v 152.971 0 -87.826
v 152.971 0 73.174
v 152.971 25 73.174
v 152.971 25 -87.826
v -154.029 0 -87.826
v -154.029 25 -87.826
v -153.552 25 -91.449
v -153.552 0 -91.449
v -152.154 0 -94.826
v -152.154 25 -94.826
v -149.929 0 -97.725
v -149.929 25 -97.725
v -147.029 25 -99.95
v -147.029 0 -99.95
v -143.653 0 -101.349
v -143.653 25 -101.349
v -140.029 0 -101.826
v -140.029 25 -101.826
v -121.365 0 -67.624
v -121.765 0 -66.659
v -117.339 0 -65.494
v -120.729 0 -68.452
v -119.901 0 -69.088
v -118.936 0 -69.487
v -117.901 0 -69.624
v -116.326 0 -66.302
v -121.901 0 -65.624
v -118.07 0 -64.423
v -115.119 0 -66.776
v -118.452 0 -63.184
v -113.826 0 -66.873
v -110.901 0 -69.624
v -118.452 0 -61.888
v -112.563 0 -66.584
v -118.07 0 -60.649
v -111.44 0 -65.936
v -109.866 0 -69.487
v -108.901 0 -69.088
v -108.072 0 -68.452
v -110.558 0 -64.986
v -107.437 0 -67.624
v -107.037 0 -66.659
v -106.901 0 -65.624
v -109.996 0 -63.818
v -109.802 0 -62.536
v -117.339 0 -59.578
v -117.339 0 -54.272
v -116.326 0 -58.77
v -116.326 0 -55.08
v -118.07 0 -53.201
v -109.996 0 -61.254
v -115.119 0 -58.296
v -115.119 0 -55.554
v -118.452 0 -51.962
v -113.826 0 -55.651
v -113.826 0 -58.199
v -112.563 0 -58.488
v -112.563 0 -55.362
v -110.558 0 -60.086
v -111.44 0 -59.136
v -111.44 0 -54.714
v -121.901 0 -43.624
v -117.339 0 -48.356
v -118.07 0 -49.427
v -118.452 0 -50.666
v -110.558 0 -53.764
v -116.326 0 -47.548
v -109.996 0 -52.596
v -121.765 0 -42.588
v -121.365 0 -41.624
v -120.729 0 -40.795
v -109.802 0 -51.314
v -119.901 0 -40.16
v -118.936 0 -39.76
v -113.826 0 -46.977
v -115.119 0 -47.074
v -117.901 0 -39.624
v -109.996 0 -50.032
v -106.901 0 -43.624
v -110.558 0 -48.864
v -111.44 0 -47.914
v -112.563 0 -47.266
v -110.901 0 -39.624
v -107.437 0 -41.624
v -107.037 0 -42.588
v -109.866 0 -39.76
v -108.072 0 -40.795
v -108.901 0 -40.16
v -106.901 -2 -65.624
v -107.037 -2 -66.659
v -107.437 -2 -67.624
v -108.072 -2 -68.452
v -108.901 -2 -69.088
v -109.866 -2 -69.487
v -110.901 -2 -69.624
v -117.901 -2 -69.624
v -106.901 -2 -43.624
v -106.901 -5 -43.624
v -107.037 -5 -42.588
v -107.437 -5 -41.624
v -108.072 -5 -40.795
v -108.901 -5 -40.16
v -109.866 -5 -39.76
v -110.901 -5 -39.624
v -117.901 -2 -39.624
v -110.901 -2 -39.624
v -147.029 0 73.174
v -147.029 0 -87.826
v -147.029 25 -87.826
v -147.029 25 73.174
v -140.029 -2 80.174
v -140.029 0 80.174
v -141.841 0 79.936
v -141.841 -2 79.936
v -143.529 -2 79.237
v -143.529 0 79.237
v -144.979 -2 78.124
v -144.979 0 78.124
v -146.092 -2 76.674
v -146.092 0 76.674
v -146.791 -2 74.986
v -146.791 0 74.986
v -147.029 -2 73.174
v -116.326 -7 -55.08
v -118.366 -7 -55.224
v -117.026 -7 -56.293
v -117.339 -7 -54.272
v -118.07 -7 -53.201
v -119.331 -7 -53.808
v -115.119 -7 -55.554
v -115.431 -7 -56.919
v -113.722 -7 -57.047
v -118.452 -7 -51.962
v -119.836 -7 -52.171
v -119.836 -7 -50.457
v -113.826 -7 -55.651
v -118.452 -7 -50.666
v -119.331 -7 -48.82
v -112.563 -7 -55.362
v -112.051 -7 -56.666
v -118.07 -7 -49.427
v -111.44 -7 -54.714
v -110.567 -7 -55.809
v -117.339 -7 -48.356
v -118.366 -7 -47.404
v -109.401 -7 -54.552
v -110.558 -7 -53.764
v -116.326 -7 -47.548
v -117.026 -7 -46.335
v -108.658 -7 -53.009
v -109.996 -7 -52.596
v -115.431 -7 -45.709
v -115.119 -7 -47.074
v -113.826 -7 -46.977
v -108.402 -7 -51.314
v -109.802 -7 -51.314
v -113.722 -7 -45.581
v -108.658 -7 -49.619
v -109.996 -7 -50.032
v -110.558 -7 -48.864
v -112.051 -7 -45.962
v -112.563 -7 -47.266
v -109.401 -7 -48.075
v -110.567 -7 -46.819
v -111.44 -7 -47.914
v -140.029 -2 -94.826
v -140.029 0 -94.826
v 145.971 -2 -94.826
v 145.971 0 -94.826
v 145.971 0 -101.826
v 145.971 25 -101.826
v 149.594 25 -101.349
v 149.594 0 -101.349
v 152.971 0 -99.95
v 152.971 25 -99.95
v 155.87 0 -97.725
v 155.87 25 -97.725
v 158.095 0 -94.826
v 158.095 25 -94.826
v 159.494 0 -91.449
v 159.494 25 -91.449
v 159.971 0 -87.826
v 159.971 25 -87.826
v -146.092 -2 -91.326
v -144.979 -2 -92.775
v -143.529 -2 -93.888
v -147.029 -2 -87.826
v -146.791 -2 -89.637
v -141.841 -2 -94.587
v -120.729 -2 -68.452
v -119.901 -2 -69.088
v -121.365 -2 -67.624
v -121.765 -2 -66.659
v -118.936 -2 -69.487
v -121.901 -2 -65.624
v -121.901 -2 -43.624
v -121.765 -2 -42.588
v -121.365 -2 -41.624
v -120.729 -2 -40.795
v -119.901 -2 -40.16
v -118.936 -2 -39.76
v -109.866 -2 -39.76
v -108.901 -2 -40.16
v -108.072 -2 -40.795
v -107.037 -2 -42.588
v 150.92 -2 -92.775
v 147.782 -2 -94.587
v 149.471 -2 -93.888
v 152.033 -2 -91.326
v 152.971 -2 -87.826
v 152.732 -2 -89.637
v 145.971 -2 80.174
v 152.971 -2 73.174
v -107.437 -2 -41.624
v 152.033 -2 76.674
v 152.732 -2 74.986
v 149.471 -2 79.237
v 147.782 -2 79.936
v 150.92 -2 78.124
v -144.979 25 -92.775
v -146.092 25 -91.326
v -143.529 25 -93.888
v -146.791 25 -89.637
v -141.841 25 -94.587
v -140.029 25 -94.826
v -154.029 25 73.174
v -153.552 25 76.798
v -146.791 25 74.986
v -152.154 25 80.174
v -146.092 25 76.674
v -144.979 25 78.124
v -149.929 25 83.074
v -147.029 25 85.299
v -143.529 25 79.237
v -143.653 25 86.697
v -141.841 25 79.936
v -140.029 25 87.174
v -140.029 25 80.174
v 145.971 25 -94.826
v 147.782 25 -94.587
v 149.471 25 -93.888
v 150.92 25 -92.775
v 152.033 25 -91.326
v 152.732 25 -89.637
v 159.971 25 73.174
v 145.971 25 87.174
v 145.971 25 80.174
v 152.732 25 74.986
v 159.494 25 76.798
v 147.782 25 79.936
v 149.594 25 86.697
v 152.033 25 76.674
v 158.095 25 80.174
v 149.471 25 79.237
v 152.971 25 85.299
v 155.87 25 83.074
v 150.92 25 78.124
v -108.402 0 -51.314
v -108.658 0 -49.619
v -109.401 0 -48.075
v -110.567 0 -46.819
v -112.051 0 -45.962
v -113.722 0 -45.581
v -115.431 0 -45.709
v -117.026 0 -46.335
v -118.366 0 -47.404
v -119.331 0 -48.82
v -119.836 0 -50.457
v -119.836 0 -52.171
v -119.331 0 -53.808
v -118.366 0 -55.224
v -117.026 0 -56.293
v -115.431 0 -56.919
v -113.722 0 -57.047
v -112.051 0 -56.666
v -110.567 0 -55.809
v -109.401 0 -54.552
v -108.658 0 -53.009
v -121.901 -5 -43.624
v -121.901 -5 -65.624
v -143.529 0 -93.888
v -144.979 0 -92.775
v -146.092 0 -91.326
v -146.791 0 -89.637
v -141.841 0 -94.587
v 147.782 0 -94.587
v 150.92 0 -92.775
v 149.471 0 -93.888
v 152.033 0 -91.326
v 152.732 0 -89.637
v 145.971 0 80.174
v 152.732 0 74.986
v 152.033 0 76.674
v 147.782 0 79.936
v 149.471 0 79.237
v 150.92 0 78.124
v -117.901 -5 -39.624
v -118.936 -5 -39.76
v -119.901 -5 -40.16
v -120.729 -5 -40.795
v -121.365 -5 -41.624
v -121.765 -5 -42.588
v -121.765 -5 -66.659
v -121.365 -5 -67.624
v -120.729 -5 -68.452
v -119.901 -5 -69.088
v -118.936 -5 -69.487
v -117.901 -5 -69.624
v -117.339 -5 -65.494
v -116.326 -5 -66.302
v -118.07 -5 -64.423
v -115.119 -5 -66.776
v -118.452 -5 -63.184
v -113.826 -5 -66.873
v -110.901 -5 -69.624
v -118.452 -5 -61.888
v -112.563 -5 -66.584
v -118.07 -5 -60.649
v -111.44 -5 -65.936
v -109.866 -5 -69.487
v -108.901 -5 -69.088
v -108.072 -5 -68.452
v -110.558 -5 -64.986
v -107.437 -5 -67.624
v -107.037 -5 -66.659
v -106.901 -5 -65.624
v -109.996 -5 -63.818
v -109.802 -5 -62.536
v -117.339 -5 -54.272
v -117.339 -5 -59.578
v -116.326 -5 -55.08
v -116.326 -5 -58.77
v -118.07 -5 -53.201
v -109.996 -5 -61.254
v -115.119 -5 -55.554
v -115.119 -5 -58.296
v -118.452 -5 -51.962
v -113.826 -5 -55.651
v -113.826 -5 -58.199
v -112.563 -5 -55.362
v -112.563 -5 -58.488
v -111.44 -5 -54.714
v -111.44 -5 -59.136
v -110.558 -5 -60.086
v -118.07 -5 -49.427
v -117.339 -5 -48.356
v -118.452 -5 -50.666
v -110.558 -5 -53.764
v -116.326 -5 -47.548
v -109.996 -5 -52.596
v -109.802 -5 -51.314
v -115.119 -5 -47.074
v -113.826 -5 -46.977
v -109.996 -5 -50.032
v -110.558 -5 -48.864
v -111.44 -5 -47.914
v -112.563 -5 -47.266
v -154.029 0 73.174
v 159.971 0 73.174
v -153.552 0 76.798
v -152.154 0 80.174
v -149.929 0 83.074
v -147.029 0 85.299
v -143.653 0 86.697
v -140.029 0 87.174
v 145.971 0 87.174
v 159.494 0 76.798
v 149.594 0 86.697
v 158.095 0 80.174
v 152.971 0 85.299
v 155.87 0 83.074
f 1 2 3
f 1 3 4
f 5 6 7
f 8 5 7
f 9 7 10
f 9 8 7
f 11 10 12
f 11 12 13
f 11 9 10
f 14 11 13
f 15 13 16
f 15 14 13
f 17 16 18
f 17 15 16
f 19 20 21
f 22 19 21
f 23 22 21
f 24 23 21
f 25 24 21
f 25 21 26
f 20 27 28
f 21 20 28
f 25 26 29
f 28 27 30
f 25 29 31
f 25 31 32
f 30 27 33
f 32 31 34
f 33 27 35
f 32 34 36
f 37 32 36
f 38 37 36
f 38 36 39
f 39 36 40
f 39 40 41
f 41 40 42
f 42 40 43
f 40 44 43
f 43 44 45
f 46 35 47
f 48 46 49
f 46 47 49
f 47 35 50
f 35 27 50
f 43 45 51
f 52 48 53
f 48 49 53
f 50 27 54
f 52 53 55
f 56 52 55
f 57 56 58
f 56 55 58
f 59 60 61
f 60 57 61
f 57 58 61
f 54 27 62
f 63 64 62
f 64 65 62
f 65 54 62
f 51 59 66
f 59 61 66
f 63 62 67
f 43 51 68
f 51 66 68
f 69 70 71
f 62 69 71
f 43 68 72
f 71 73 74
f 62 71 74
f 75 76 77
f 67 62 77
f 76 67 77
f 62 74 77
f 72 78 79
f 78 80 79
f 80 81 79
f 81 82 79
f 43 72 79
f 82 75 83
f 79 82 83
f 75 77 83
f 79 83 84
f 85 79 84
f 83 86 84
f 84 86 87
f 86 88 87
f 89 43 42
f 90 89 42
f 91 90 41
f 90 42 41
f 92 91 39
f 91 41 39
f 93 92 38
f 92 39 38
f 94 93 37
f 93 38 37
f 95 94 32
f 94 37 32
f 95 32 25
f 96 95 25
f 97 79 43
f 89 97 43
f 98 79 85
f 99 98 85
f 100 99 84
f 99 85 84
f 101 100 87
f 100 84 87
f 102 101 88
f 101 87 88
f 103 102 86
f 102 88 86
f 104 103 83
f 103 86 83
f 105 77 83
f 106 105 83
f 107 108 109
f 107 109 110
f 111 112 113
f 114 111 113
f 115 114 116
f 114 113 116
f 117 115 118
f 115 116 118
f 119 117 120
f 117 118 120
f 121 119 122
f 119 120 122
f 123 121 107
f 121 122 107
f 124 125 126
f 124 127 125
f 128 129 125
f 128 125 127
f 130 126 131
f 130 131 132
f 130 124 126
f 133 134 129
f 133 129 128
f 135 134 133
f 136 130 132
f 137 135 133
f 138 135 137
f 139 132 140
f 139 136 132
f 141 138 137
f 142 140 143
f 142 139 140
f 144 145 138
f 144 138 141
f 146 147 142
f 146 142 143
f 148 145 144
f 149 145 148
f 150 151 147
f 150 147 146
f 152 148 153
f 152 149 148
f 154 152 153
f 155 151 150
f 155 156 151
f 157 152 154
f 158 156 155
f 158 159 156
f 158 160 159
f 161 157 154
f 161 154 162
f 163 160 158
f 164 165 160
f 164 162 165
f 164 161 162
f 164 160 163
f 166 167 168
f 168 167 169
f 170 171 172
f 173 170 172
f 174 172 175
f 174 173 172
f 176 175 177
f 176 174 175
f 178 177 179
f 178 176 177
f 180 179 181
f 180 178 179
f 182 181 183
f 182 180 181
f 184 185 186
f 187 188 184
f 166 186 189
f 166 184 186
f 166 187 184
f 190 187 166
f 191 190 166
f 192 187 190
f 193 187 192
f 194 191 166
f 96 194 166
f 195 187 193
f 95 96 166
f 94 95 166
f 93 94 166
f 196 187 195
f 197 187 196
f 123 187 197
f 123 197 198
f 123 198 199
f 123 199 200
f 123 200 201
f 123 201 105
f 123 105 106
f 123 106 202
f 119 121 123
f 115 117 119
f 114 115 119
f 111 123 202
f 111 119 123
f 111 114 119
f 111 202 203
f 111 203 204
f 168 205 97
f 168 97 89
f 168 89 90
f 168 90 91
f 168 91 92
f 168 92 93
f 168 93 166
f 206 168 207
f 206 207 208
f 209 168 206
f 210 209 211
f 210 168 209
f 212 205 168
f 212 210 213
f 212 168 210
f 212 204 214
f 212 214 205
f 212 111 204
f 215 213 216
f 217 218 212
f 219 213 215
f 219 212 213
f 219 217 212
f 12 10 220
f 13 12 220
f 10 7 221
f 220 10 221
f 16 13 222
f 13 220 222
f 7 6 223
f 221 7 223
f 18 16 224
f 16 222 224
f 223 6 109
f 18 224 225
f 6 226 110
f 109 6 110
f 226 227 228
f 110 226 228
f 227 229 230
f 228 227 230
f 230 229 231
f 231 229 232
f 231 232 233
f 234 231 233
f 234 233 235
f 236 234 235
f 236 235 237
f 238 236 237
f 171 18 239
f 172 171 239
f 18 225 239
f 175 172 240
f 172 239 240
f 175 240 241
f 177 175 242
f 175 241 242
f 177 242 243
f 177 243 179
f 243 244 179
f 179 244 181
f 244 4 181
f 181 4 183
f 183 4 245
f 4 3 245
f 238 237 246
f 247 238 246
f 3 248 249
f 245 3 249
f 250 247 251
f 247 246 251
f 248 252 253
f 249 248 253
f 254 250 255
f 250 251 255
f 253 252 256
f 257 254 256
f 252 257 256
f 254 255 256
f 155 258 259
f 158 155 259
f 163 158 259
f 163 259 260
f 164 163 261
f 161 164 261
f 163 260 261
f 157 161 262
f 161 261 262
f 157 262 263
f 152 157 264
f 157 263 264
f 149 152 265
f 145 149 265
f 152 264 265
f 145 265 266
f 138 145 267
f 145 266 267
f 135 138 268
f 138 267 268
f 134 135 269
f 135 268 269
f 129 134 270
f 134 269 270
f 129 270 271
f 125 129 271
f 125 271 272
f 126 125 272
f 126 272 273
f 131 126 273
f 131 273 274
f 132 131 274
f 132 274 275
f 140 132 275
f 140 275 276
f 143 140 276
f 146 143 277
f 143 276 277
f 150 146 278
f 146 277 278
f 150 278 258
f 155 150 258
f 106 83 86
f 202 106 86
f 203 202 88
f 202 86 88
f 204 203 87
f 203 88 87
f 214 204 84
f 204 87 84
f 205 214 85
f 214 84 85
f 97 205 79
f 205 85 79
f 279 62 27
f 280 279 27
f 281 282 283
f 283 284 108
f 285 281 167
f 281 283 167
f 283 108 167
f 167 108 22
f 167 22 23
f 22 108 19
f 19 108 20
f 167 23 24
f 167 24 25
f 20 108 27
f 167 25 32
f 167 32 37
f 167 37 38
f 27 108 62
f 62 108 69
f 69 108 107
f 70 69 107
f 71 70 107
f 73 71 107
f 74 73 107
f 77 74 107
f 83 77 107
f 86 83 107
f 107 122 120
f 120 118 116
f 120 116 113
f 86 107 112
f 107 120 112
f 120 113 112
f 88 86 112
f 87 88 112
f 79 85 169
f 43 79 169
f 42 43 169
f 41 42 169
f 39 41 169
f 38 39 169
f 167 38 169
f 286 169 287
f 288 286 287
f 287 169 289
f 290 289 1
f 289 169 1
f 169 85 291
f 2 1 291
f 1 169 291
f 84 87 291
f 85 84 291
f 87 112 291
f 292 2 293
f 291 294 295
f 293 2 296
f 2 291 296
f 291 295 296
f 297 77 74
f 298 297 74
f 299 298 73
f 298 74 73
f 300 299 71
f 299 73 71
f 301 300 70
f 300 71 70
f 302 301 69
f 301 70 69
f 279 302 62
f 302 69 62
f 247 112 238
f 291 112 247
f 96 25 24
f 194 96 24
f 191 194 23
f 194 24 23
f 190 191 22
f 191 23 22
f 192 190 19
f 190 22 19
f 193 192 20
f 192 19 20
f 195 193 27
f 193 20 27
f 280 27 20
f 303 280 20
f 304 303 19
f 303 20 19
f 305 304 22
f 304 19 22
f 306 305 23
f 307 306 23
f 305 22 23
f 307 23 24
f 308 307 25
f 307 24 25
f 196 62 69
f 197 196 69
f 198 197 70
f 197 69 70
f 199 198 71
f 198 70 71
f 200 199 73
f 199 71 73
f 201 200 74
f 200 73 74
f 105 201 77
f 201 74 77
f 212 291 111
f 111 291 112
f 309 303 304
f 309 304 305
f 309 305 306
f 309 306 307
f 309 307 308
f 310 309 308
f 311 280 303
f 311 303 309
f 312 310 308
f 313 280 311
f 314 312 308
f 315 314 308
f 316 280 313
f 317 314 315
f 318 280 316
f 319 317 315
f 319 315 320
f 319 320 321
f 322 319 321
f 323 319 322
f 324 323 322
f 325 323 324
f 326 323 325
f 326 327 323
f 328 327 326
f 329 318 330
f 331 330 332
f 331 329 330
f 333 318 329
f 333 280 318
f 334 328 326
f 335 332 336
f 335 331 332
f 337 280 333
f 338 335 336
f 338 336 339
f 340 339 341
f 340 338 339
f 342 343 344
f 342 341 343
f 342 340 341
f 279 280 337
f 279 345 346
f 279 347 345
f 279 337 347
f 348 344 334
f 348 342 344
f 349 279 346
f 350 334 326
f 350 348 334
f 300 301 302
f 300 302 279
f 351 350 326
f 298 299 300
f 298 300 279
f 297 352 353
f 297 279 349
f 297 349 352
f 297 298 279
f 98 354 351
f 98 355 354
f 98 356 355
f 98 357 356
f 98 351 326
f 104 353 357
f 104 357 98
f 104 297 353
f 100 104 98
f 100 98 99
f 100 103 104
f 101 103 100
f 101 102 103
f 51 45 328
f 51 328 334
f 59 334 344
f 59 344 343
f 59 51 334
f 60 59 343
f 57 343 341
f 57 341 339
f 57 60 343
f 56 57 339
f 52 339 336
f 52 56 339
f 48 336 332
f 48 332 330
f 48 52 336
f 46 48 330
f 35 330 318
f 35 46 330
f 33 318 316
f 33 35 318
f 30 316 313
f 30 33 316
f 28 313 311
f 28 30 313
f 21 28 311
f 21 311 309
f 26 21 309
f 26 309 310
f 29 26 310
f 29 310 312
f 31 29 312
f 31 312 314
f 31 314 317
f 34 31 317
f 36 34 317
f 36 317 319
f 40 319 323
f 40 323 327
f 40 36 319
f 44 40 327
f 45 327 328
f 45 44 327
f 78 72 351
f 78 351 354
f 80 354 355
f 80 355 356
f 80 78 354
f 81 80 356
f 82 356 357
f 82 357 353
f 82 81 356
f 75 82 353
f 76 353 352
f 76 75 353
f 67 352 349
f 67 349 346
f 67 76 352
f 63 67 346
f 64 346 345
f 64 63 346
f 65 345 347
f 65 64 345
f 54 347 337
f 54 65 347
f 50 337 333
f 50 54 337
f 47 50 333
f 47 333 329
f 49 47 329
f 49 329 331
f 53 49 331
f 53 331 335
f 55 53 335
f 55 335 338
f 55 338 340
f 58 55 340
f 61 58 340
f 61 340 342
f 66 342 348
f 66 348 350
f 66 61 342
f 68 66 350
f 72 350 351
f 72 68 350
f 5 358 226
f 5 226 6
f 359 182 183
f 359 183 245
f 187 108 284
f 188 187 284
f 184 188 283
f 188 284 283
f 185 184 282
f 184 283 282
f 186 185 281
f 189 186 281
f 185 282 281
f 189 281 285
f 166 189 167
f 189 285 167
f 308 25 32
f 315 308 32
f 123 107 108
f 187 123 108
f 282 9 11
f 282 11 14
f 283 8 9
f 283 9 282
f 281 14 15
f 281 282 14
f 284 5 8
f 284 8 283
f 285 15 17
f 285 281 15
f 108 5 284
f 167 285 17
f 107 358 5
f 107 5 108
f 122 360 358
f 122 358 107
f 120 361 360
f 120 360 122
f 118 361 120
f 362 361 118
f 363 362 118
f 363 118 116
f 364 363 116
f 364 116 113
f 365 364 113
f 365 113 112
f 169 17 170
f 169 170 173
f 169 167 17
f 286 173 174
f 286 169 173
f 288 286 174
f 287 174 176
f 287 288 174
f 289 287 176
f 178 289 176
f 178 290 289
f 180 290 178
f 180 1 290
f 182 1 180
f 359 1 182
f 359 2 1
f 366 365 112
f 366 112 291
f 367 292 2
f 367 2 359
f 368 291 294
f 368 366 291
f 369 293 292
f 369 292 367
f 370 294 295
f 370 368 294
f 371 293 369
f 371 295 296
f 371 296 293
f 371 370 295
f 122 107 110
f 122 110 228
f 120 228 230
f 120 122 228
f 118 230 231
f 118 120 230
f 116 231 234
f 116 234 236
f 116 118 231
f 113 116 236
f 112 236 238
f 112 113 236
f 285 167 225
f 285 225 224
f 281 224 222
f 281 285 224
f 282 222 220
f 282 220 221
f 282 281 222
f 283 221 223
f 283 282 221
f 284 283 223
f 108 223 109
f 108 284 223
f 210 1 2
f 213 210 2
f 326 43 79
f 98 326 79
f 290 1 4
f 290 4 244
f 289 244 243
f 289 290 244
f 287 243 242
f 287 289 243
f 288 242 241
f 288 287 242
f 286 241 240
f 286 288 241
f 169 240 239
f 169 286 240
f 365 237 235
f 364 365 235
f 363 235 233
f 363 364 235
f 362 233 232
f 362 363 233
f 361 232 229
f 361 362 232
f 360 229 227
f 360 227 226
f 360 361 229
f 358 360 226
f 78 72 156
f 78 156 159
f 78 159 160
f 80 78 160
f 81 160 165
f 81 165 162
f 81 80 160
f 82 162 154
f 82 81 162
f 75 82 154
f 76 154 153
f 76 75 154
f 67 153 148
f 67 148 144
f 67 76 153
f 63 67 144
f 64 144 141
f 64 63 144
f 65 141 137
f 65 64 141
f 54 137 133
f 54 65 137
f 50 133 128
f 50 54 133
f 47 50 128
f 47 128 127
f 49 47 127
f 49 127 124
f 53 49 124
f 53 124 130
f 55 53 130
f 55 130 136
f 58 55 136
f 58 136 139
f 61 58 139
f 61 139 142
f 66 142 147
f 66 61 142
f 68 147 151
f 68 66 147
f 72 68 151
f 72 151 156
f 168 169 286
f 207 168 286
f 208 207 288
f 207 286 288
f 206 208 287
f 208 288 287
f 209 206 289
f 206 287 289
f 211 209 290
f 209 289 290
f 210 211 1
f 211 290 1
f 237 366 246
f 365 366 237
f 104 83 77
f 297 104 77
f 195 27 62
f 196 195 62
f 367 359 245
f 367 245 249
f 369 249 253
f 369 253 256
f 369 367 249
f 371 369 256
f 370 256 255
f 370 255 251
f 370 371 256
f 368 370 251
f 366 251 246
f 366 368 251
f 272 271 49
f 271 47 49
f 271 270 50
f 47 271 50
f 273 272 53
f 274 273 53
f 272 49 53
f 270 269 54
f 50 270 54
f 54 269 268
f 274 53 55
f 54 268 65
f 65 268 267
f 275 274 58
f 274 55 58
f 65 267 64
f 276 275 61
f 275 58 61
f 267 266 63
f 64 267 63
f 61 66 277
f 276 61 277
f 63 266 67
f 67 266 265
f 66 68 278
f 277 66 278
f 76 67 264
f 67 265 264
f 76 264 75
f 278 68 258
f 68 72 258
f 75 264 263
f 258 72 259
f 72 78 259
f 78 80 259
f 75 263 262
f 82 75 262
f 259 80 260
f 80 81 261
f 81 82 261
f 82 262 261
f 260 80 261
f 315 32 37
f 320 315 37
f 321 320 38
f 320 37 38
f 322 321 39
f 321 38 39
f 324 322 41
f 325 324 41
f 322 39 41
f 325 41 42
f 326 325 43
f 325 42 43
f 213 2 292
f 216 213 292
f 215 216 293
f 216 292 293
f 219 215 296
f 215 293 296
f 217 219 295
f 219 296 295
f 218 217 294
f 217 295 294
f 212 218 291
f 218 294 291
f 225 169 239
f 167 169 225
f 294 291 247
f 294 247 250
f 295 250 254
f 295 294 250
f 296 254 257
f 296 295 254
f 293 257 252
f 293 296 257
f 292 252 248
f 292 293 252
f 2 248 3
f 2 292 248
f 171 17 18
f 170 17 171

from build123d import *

# Parameters (mm, degrees)
F1_DEPTH = 25
F2_DEPTH = 2
F0_R     = 4.348998023
F0_R_2   = 5.7489946485
F3_DEPTH = 5
F4_DEPTH = 7


with BuildPart() as f1:
    # F0 (on Front) → F1 (new body)
    with BuildSketch(Plane.XZ):
        with BuildLine():
            Line((145.9706694186, 87.1744155884), (-140.0293305814, 87.1744155884))
            ThreePointArc((-140.0293305814, 87.1744155884), (-149.9288249466, 83.0739107617), (-154.0293297732, 73.1744163966))
            Line((-154.0293297732, 73.1744163966), (-154.0293297732, -87.8255836034))
            ThreePointArc((-154.0293297732, -87.8255836034), (-149.9288249466, -97.7250779685), (-140.0293305814, -101.8255827952))
            Line((-140.0293305814, -101.8255827952), (145.9706694186, -101.8255827952))
            ThreePointArc((145.9706694186, -101.8255827952), (155.8701637837, -97.7250779685), (159.9706686104, -87.8255836034))
            Line((159.9706686104, -87.8255836034), (159.9706686104, 73.1744163966))
            ThreePointArc((159.9706686104, 73.1744163966), (155.8701637837, 83.0739107617), (145.9706694186, 87.1744155884))
        make_face()
        with BuildLine():
            ThreePointArc((-147.0293305814, 73.1744163966), (-144.9790780497, 78.1241638649), (-140.0293305814, 80.1744163966))
            Line((-140.0293305814, 80.1744163966), (145.9706694186, 80.1744163966))
            ThreePointArc((145.9706694186, 80.1744163966), (150.9204168869, 78.1241638649), (152.9706694186, 73.1744163966))
            Line((152.9706694186, 73.1744163966), (152.9706694186, -87.8255836034))
            ThreePointArc((152.9706694186, -87.8255836034), (150.9204168869, -92.7753310717), (145.9706694186, -94.8255836034))
            Line((145.9706694186, -94.8255836034), (-140.0293305814, -94.8255836034))
            ThreePointArc((-140.0293305814, -94.8255836034), (-144.9790780497, -92.7753310717), (-147.0293305814, -87.8255836034))
            Line((-147.0293305814, -87.8255836034), (-147.0293305814, 73.1744163966))
        make_face(mode=Mode.SUBTRACT)
    extrude(amount=-F1_DEPTH)


with BuildPart() as f2:
    # F0 (on Front) → F2 (new body)
    with BuildSketch(Plane.XZ):
        with BuildLine():
            Line((145.9706694186, 80.1744163966), (-140.0293305814, 80.1744163966))
            ThreePointArc((-140.0293305814, 80.1744163966), (-144.9790780497, 78.1241638649), (-147.0293305814, 73.1744163966))
            Line((-147.0293305814, 73.1744163966), (-147.0293305814, -87.8255836034))
            ThreePointArc((-147.0293305814, -87.8255836034), (-144.9790780497, -92.7753310717), (-140.0293305814, -94.8255836034))
            Line((-140.0293305814, -94.8255836034), (145.9706694186, -94.8255836034))
            ThreePointArc((145.9706694186, -94.8255836034), (150.9204168869, -92.7753310717), (152.9706694186, -87.8255836034))
            Line((152.9706694186, -87.8255836034), (152.9706694186, 73.1744163966))
            ThreePointArc((152.9706694186, 73.1744163966), (150.9204168869, 78.1241638649), (145.9706694186, 80.1744163966))
        make_face()
        with BuildLine():
            ThreePointArc((-121.900819242, -43.6237730914), (-120.7292463667, -40.7953459667), (-117.900819242, -39.6237730914))
            Line((-117.900819242, -39.6237730914), (-110.900819242, -39.6237730914))
            ThreePointArc((-110.900819242, -39.6237730914), (-108.0723921173, -40.7953459667), (-106.900819242, -43.6237730914))
            Line((-106.900819242, -43.6237730914), (-106.900819242, -65.6237730914))
            ThreePointArc((-106.900819242, -65.6237730914), (-108.0723921173, -68.4522002162), (-110.900819242, -69.6237730914))
            Line((-110.900819242, -69.6237730914), (-117.900819242, -69.6237730914))
            ThreePointArc((-117.900819242, -69.6237730914), (-120.7292463667, -68.4522002162), (-121.900819242, -65.6237730914))
            Line((-121.900819242, -65.6237730914), (-121.900819242, -43.6237730914))
        make_face(mode=Mode.SUBTRACT)
    extrude(amount=F2_DEPTH)


with BuildPart() as f3:
    # F0 (on Front) → F3 (new body)
    with BuildSketch(Plane.XZ):
        with BuildLine():
            Line((-110.900819242, -39.6237730914), (-117.900819242, -39.6237730914))
            ThreePointArc((-117.900819242, -39.6237730914), (-120.7292463667, -40.7953459667), (-121.900819242, -43.6237730914))
            Line((-121.900819242, -43.6237730914), (-121.900819242, -65.6237730914))
            ThreePointArc((-121.900819242, -65.6237730914), (-120.7292463667, -68.4522002162), (-117.900819242, -69.6237730914))
            Line((-117.900819242, -69.6237730914), (-110.900819242, -69.6237730914))
            ThreePointArc((-110.900819242, -69.6237730914), (-108.0723921173, -68.4522002162), (-106.900819242, -65.6237730914))
            Line((-106.900819242, -65.6237730914), (-106.900819242, -43.6237730914))
            ThreePointArc((-106.900819242, -43.6237730914), (-108.0723921173, -40.7953459667), (-110.900819242, -39.6237730914))
        make_face()
        with Locations((-114.151455462, -62.5361315906)):
            Circle(F0_R, mode=Mode.SUBTRACT)
        with Locations((-114.151455462, -51.313970238)):
            Circle(F0_R_2, mode=Mode.SUBTRACT)
        with Locations((-114.151455462, -51.313970238)):
            Circle(F0_R_2)
        with Locations((-114.151455462, -51.313970238)):
            Circle(F0_R, mode=Mode.SUBTRACT)
    extrude(amount=F3_DEPTH)


with BuildPart() as f4:
    # F0 (on Front) → F4 (new body)
    with BuildSketch(Plane.XZ):
        with Locations((-114.151455462, -51.313970238)):
            Circle(F0_R_2)
        with Locations((-114.151455462, -51.313970238)):
            Circle(F0_R, mode=Mode.SUBTRACT)
    extrude(amount=F4_DEPTH)


solid = Compound([f1.part, f2.part, f3.part, f4.part])
